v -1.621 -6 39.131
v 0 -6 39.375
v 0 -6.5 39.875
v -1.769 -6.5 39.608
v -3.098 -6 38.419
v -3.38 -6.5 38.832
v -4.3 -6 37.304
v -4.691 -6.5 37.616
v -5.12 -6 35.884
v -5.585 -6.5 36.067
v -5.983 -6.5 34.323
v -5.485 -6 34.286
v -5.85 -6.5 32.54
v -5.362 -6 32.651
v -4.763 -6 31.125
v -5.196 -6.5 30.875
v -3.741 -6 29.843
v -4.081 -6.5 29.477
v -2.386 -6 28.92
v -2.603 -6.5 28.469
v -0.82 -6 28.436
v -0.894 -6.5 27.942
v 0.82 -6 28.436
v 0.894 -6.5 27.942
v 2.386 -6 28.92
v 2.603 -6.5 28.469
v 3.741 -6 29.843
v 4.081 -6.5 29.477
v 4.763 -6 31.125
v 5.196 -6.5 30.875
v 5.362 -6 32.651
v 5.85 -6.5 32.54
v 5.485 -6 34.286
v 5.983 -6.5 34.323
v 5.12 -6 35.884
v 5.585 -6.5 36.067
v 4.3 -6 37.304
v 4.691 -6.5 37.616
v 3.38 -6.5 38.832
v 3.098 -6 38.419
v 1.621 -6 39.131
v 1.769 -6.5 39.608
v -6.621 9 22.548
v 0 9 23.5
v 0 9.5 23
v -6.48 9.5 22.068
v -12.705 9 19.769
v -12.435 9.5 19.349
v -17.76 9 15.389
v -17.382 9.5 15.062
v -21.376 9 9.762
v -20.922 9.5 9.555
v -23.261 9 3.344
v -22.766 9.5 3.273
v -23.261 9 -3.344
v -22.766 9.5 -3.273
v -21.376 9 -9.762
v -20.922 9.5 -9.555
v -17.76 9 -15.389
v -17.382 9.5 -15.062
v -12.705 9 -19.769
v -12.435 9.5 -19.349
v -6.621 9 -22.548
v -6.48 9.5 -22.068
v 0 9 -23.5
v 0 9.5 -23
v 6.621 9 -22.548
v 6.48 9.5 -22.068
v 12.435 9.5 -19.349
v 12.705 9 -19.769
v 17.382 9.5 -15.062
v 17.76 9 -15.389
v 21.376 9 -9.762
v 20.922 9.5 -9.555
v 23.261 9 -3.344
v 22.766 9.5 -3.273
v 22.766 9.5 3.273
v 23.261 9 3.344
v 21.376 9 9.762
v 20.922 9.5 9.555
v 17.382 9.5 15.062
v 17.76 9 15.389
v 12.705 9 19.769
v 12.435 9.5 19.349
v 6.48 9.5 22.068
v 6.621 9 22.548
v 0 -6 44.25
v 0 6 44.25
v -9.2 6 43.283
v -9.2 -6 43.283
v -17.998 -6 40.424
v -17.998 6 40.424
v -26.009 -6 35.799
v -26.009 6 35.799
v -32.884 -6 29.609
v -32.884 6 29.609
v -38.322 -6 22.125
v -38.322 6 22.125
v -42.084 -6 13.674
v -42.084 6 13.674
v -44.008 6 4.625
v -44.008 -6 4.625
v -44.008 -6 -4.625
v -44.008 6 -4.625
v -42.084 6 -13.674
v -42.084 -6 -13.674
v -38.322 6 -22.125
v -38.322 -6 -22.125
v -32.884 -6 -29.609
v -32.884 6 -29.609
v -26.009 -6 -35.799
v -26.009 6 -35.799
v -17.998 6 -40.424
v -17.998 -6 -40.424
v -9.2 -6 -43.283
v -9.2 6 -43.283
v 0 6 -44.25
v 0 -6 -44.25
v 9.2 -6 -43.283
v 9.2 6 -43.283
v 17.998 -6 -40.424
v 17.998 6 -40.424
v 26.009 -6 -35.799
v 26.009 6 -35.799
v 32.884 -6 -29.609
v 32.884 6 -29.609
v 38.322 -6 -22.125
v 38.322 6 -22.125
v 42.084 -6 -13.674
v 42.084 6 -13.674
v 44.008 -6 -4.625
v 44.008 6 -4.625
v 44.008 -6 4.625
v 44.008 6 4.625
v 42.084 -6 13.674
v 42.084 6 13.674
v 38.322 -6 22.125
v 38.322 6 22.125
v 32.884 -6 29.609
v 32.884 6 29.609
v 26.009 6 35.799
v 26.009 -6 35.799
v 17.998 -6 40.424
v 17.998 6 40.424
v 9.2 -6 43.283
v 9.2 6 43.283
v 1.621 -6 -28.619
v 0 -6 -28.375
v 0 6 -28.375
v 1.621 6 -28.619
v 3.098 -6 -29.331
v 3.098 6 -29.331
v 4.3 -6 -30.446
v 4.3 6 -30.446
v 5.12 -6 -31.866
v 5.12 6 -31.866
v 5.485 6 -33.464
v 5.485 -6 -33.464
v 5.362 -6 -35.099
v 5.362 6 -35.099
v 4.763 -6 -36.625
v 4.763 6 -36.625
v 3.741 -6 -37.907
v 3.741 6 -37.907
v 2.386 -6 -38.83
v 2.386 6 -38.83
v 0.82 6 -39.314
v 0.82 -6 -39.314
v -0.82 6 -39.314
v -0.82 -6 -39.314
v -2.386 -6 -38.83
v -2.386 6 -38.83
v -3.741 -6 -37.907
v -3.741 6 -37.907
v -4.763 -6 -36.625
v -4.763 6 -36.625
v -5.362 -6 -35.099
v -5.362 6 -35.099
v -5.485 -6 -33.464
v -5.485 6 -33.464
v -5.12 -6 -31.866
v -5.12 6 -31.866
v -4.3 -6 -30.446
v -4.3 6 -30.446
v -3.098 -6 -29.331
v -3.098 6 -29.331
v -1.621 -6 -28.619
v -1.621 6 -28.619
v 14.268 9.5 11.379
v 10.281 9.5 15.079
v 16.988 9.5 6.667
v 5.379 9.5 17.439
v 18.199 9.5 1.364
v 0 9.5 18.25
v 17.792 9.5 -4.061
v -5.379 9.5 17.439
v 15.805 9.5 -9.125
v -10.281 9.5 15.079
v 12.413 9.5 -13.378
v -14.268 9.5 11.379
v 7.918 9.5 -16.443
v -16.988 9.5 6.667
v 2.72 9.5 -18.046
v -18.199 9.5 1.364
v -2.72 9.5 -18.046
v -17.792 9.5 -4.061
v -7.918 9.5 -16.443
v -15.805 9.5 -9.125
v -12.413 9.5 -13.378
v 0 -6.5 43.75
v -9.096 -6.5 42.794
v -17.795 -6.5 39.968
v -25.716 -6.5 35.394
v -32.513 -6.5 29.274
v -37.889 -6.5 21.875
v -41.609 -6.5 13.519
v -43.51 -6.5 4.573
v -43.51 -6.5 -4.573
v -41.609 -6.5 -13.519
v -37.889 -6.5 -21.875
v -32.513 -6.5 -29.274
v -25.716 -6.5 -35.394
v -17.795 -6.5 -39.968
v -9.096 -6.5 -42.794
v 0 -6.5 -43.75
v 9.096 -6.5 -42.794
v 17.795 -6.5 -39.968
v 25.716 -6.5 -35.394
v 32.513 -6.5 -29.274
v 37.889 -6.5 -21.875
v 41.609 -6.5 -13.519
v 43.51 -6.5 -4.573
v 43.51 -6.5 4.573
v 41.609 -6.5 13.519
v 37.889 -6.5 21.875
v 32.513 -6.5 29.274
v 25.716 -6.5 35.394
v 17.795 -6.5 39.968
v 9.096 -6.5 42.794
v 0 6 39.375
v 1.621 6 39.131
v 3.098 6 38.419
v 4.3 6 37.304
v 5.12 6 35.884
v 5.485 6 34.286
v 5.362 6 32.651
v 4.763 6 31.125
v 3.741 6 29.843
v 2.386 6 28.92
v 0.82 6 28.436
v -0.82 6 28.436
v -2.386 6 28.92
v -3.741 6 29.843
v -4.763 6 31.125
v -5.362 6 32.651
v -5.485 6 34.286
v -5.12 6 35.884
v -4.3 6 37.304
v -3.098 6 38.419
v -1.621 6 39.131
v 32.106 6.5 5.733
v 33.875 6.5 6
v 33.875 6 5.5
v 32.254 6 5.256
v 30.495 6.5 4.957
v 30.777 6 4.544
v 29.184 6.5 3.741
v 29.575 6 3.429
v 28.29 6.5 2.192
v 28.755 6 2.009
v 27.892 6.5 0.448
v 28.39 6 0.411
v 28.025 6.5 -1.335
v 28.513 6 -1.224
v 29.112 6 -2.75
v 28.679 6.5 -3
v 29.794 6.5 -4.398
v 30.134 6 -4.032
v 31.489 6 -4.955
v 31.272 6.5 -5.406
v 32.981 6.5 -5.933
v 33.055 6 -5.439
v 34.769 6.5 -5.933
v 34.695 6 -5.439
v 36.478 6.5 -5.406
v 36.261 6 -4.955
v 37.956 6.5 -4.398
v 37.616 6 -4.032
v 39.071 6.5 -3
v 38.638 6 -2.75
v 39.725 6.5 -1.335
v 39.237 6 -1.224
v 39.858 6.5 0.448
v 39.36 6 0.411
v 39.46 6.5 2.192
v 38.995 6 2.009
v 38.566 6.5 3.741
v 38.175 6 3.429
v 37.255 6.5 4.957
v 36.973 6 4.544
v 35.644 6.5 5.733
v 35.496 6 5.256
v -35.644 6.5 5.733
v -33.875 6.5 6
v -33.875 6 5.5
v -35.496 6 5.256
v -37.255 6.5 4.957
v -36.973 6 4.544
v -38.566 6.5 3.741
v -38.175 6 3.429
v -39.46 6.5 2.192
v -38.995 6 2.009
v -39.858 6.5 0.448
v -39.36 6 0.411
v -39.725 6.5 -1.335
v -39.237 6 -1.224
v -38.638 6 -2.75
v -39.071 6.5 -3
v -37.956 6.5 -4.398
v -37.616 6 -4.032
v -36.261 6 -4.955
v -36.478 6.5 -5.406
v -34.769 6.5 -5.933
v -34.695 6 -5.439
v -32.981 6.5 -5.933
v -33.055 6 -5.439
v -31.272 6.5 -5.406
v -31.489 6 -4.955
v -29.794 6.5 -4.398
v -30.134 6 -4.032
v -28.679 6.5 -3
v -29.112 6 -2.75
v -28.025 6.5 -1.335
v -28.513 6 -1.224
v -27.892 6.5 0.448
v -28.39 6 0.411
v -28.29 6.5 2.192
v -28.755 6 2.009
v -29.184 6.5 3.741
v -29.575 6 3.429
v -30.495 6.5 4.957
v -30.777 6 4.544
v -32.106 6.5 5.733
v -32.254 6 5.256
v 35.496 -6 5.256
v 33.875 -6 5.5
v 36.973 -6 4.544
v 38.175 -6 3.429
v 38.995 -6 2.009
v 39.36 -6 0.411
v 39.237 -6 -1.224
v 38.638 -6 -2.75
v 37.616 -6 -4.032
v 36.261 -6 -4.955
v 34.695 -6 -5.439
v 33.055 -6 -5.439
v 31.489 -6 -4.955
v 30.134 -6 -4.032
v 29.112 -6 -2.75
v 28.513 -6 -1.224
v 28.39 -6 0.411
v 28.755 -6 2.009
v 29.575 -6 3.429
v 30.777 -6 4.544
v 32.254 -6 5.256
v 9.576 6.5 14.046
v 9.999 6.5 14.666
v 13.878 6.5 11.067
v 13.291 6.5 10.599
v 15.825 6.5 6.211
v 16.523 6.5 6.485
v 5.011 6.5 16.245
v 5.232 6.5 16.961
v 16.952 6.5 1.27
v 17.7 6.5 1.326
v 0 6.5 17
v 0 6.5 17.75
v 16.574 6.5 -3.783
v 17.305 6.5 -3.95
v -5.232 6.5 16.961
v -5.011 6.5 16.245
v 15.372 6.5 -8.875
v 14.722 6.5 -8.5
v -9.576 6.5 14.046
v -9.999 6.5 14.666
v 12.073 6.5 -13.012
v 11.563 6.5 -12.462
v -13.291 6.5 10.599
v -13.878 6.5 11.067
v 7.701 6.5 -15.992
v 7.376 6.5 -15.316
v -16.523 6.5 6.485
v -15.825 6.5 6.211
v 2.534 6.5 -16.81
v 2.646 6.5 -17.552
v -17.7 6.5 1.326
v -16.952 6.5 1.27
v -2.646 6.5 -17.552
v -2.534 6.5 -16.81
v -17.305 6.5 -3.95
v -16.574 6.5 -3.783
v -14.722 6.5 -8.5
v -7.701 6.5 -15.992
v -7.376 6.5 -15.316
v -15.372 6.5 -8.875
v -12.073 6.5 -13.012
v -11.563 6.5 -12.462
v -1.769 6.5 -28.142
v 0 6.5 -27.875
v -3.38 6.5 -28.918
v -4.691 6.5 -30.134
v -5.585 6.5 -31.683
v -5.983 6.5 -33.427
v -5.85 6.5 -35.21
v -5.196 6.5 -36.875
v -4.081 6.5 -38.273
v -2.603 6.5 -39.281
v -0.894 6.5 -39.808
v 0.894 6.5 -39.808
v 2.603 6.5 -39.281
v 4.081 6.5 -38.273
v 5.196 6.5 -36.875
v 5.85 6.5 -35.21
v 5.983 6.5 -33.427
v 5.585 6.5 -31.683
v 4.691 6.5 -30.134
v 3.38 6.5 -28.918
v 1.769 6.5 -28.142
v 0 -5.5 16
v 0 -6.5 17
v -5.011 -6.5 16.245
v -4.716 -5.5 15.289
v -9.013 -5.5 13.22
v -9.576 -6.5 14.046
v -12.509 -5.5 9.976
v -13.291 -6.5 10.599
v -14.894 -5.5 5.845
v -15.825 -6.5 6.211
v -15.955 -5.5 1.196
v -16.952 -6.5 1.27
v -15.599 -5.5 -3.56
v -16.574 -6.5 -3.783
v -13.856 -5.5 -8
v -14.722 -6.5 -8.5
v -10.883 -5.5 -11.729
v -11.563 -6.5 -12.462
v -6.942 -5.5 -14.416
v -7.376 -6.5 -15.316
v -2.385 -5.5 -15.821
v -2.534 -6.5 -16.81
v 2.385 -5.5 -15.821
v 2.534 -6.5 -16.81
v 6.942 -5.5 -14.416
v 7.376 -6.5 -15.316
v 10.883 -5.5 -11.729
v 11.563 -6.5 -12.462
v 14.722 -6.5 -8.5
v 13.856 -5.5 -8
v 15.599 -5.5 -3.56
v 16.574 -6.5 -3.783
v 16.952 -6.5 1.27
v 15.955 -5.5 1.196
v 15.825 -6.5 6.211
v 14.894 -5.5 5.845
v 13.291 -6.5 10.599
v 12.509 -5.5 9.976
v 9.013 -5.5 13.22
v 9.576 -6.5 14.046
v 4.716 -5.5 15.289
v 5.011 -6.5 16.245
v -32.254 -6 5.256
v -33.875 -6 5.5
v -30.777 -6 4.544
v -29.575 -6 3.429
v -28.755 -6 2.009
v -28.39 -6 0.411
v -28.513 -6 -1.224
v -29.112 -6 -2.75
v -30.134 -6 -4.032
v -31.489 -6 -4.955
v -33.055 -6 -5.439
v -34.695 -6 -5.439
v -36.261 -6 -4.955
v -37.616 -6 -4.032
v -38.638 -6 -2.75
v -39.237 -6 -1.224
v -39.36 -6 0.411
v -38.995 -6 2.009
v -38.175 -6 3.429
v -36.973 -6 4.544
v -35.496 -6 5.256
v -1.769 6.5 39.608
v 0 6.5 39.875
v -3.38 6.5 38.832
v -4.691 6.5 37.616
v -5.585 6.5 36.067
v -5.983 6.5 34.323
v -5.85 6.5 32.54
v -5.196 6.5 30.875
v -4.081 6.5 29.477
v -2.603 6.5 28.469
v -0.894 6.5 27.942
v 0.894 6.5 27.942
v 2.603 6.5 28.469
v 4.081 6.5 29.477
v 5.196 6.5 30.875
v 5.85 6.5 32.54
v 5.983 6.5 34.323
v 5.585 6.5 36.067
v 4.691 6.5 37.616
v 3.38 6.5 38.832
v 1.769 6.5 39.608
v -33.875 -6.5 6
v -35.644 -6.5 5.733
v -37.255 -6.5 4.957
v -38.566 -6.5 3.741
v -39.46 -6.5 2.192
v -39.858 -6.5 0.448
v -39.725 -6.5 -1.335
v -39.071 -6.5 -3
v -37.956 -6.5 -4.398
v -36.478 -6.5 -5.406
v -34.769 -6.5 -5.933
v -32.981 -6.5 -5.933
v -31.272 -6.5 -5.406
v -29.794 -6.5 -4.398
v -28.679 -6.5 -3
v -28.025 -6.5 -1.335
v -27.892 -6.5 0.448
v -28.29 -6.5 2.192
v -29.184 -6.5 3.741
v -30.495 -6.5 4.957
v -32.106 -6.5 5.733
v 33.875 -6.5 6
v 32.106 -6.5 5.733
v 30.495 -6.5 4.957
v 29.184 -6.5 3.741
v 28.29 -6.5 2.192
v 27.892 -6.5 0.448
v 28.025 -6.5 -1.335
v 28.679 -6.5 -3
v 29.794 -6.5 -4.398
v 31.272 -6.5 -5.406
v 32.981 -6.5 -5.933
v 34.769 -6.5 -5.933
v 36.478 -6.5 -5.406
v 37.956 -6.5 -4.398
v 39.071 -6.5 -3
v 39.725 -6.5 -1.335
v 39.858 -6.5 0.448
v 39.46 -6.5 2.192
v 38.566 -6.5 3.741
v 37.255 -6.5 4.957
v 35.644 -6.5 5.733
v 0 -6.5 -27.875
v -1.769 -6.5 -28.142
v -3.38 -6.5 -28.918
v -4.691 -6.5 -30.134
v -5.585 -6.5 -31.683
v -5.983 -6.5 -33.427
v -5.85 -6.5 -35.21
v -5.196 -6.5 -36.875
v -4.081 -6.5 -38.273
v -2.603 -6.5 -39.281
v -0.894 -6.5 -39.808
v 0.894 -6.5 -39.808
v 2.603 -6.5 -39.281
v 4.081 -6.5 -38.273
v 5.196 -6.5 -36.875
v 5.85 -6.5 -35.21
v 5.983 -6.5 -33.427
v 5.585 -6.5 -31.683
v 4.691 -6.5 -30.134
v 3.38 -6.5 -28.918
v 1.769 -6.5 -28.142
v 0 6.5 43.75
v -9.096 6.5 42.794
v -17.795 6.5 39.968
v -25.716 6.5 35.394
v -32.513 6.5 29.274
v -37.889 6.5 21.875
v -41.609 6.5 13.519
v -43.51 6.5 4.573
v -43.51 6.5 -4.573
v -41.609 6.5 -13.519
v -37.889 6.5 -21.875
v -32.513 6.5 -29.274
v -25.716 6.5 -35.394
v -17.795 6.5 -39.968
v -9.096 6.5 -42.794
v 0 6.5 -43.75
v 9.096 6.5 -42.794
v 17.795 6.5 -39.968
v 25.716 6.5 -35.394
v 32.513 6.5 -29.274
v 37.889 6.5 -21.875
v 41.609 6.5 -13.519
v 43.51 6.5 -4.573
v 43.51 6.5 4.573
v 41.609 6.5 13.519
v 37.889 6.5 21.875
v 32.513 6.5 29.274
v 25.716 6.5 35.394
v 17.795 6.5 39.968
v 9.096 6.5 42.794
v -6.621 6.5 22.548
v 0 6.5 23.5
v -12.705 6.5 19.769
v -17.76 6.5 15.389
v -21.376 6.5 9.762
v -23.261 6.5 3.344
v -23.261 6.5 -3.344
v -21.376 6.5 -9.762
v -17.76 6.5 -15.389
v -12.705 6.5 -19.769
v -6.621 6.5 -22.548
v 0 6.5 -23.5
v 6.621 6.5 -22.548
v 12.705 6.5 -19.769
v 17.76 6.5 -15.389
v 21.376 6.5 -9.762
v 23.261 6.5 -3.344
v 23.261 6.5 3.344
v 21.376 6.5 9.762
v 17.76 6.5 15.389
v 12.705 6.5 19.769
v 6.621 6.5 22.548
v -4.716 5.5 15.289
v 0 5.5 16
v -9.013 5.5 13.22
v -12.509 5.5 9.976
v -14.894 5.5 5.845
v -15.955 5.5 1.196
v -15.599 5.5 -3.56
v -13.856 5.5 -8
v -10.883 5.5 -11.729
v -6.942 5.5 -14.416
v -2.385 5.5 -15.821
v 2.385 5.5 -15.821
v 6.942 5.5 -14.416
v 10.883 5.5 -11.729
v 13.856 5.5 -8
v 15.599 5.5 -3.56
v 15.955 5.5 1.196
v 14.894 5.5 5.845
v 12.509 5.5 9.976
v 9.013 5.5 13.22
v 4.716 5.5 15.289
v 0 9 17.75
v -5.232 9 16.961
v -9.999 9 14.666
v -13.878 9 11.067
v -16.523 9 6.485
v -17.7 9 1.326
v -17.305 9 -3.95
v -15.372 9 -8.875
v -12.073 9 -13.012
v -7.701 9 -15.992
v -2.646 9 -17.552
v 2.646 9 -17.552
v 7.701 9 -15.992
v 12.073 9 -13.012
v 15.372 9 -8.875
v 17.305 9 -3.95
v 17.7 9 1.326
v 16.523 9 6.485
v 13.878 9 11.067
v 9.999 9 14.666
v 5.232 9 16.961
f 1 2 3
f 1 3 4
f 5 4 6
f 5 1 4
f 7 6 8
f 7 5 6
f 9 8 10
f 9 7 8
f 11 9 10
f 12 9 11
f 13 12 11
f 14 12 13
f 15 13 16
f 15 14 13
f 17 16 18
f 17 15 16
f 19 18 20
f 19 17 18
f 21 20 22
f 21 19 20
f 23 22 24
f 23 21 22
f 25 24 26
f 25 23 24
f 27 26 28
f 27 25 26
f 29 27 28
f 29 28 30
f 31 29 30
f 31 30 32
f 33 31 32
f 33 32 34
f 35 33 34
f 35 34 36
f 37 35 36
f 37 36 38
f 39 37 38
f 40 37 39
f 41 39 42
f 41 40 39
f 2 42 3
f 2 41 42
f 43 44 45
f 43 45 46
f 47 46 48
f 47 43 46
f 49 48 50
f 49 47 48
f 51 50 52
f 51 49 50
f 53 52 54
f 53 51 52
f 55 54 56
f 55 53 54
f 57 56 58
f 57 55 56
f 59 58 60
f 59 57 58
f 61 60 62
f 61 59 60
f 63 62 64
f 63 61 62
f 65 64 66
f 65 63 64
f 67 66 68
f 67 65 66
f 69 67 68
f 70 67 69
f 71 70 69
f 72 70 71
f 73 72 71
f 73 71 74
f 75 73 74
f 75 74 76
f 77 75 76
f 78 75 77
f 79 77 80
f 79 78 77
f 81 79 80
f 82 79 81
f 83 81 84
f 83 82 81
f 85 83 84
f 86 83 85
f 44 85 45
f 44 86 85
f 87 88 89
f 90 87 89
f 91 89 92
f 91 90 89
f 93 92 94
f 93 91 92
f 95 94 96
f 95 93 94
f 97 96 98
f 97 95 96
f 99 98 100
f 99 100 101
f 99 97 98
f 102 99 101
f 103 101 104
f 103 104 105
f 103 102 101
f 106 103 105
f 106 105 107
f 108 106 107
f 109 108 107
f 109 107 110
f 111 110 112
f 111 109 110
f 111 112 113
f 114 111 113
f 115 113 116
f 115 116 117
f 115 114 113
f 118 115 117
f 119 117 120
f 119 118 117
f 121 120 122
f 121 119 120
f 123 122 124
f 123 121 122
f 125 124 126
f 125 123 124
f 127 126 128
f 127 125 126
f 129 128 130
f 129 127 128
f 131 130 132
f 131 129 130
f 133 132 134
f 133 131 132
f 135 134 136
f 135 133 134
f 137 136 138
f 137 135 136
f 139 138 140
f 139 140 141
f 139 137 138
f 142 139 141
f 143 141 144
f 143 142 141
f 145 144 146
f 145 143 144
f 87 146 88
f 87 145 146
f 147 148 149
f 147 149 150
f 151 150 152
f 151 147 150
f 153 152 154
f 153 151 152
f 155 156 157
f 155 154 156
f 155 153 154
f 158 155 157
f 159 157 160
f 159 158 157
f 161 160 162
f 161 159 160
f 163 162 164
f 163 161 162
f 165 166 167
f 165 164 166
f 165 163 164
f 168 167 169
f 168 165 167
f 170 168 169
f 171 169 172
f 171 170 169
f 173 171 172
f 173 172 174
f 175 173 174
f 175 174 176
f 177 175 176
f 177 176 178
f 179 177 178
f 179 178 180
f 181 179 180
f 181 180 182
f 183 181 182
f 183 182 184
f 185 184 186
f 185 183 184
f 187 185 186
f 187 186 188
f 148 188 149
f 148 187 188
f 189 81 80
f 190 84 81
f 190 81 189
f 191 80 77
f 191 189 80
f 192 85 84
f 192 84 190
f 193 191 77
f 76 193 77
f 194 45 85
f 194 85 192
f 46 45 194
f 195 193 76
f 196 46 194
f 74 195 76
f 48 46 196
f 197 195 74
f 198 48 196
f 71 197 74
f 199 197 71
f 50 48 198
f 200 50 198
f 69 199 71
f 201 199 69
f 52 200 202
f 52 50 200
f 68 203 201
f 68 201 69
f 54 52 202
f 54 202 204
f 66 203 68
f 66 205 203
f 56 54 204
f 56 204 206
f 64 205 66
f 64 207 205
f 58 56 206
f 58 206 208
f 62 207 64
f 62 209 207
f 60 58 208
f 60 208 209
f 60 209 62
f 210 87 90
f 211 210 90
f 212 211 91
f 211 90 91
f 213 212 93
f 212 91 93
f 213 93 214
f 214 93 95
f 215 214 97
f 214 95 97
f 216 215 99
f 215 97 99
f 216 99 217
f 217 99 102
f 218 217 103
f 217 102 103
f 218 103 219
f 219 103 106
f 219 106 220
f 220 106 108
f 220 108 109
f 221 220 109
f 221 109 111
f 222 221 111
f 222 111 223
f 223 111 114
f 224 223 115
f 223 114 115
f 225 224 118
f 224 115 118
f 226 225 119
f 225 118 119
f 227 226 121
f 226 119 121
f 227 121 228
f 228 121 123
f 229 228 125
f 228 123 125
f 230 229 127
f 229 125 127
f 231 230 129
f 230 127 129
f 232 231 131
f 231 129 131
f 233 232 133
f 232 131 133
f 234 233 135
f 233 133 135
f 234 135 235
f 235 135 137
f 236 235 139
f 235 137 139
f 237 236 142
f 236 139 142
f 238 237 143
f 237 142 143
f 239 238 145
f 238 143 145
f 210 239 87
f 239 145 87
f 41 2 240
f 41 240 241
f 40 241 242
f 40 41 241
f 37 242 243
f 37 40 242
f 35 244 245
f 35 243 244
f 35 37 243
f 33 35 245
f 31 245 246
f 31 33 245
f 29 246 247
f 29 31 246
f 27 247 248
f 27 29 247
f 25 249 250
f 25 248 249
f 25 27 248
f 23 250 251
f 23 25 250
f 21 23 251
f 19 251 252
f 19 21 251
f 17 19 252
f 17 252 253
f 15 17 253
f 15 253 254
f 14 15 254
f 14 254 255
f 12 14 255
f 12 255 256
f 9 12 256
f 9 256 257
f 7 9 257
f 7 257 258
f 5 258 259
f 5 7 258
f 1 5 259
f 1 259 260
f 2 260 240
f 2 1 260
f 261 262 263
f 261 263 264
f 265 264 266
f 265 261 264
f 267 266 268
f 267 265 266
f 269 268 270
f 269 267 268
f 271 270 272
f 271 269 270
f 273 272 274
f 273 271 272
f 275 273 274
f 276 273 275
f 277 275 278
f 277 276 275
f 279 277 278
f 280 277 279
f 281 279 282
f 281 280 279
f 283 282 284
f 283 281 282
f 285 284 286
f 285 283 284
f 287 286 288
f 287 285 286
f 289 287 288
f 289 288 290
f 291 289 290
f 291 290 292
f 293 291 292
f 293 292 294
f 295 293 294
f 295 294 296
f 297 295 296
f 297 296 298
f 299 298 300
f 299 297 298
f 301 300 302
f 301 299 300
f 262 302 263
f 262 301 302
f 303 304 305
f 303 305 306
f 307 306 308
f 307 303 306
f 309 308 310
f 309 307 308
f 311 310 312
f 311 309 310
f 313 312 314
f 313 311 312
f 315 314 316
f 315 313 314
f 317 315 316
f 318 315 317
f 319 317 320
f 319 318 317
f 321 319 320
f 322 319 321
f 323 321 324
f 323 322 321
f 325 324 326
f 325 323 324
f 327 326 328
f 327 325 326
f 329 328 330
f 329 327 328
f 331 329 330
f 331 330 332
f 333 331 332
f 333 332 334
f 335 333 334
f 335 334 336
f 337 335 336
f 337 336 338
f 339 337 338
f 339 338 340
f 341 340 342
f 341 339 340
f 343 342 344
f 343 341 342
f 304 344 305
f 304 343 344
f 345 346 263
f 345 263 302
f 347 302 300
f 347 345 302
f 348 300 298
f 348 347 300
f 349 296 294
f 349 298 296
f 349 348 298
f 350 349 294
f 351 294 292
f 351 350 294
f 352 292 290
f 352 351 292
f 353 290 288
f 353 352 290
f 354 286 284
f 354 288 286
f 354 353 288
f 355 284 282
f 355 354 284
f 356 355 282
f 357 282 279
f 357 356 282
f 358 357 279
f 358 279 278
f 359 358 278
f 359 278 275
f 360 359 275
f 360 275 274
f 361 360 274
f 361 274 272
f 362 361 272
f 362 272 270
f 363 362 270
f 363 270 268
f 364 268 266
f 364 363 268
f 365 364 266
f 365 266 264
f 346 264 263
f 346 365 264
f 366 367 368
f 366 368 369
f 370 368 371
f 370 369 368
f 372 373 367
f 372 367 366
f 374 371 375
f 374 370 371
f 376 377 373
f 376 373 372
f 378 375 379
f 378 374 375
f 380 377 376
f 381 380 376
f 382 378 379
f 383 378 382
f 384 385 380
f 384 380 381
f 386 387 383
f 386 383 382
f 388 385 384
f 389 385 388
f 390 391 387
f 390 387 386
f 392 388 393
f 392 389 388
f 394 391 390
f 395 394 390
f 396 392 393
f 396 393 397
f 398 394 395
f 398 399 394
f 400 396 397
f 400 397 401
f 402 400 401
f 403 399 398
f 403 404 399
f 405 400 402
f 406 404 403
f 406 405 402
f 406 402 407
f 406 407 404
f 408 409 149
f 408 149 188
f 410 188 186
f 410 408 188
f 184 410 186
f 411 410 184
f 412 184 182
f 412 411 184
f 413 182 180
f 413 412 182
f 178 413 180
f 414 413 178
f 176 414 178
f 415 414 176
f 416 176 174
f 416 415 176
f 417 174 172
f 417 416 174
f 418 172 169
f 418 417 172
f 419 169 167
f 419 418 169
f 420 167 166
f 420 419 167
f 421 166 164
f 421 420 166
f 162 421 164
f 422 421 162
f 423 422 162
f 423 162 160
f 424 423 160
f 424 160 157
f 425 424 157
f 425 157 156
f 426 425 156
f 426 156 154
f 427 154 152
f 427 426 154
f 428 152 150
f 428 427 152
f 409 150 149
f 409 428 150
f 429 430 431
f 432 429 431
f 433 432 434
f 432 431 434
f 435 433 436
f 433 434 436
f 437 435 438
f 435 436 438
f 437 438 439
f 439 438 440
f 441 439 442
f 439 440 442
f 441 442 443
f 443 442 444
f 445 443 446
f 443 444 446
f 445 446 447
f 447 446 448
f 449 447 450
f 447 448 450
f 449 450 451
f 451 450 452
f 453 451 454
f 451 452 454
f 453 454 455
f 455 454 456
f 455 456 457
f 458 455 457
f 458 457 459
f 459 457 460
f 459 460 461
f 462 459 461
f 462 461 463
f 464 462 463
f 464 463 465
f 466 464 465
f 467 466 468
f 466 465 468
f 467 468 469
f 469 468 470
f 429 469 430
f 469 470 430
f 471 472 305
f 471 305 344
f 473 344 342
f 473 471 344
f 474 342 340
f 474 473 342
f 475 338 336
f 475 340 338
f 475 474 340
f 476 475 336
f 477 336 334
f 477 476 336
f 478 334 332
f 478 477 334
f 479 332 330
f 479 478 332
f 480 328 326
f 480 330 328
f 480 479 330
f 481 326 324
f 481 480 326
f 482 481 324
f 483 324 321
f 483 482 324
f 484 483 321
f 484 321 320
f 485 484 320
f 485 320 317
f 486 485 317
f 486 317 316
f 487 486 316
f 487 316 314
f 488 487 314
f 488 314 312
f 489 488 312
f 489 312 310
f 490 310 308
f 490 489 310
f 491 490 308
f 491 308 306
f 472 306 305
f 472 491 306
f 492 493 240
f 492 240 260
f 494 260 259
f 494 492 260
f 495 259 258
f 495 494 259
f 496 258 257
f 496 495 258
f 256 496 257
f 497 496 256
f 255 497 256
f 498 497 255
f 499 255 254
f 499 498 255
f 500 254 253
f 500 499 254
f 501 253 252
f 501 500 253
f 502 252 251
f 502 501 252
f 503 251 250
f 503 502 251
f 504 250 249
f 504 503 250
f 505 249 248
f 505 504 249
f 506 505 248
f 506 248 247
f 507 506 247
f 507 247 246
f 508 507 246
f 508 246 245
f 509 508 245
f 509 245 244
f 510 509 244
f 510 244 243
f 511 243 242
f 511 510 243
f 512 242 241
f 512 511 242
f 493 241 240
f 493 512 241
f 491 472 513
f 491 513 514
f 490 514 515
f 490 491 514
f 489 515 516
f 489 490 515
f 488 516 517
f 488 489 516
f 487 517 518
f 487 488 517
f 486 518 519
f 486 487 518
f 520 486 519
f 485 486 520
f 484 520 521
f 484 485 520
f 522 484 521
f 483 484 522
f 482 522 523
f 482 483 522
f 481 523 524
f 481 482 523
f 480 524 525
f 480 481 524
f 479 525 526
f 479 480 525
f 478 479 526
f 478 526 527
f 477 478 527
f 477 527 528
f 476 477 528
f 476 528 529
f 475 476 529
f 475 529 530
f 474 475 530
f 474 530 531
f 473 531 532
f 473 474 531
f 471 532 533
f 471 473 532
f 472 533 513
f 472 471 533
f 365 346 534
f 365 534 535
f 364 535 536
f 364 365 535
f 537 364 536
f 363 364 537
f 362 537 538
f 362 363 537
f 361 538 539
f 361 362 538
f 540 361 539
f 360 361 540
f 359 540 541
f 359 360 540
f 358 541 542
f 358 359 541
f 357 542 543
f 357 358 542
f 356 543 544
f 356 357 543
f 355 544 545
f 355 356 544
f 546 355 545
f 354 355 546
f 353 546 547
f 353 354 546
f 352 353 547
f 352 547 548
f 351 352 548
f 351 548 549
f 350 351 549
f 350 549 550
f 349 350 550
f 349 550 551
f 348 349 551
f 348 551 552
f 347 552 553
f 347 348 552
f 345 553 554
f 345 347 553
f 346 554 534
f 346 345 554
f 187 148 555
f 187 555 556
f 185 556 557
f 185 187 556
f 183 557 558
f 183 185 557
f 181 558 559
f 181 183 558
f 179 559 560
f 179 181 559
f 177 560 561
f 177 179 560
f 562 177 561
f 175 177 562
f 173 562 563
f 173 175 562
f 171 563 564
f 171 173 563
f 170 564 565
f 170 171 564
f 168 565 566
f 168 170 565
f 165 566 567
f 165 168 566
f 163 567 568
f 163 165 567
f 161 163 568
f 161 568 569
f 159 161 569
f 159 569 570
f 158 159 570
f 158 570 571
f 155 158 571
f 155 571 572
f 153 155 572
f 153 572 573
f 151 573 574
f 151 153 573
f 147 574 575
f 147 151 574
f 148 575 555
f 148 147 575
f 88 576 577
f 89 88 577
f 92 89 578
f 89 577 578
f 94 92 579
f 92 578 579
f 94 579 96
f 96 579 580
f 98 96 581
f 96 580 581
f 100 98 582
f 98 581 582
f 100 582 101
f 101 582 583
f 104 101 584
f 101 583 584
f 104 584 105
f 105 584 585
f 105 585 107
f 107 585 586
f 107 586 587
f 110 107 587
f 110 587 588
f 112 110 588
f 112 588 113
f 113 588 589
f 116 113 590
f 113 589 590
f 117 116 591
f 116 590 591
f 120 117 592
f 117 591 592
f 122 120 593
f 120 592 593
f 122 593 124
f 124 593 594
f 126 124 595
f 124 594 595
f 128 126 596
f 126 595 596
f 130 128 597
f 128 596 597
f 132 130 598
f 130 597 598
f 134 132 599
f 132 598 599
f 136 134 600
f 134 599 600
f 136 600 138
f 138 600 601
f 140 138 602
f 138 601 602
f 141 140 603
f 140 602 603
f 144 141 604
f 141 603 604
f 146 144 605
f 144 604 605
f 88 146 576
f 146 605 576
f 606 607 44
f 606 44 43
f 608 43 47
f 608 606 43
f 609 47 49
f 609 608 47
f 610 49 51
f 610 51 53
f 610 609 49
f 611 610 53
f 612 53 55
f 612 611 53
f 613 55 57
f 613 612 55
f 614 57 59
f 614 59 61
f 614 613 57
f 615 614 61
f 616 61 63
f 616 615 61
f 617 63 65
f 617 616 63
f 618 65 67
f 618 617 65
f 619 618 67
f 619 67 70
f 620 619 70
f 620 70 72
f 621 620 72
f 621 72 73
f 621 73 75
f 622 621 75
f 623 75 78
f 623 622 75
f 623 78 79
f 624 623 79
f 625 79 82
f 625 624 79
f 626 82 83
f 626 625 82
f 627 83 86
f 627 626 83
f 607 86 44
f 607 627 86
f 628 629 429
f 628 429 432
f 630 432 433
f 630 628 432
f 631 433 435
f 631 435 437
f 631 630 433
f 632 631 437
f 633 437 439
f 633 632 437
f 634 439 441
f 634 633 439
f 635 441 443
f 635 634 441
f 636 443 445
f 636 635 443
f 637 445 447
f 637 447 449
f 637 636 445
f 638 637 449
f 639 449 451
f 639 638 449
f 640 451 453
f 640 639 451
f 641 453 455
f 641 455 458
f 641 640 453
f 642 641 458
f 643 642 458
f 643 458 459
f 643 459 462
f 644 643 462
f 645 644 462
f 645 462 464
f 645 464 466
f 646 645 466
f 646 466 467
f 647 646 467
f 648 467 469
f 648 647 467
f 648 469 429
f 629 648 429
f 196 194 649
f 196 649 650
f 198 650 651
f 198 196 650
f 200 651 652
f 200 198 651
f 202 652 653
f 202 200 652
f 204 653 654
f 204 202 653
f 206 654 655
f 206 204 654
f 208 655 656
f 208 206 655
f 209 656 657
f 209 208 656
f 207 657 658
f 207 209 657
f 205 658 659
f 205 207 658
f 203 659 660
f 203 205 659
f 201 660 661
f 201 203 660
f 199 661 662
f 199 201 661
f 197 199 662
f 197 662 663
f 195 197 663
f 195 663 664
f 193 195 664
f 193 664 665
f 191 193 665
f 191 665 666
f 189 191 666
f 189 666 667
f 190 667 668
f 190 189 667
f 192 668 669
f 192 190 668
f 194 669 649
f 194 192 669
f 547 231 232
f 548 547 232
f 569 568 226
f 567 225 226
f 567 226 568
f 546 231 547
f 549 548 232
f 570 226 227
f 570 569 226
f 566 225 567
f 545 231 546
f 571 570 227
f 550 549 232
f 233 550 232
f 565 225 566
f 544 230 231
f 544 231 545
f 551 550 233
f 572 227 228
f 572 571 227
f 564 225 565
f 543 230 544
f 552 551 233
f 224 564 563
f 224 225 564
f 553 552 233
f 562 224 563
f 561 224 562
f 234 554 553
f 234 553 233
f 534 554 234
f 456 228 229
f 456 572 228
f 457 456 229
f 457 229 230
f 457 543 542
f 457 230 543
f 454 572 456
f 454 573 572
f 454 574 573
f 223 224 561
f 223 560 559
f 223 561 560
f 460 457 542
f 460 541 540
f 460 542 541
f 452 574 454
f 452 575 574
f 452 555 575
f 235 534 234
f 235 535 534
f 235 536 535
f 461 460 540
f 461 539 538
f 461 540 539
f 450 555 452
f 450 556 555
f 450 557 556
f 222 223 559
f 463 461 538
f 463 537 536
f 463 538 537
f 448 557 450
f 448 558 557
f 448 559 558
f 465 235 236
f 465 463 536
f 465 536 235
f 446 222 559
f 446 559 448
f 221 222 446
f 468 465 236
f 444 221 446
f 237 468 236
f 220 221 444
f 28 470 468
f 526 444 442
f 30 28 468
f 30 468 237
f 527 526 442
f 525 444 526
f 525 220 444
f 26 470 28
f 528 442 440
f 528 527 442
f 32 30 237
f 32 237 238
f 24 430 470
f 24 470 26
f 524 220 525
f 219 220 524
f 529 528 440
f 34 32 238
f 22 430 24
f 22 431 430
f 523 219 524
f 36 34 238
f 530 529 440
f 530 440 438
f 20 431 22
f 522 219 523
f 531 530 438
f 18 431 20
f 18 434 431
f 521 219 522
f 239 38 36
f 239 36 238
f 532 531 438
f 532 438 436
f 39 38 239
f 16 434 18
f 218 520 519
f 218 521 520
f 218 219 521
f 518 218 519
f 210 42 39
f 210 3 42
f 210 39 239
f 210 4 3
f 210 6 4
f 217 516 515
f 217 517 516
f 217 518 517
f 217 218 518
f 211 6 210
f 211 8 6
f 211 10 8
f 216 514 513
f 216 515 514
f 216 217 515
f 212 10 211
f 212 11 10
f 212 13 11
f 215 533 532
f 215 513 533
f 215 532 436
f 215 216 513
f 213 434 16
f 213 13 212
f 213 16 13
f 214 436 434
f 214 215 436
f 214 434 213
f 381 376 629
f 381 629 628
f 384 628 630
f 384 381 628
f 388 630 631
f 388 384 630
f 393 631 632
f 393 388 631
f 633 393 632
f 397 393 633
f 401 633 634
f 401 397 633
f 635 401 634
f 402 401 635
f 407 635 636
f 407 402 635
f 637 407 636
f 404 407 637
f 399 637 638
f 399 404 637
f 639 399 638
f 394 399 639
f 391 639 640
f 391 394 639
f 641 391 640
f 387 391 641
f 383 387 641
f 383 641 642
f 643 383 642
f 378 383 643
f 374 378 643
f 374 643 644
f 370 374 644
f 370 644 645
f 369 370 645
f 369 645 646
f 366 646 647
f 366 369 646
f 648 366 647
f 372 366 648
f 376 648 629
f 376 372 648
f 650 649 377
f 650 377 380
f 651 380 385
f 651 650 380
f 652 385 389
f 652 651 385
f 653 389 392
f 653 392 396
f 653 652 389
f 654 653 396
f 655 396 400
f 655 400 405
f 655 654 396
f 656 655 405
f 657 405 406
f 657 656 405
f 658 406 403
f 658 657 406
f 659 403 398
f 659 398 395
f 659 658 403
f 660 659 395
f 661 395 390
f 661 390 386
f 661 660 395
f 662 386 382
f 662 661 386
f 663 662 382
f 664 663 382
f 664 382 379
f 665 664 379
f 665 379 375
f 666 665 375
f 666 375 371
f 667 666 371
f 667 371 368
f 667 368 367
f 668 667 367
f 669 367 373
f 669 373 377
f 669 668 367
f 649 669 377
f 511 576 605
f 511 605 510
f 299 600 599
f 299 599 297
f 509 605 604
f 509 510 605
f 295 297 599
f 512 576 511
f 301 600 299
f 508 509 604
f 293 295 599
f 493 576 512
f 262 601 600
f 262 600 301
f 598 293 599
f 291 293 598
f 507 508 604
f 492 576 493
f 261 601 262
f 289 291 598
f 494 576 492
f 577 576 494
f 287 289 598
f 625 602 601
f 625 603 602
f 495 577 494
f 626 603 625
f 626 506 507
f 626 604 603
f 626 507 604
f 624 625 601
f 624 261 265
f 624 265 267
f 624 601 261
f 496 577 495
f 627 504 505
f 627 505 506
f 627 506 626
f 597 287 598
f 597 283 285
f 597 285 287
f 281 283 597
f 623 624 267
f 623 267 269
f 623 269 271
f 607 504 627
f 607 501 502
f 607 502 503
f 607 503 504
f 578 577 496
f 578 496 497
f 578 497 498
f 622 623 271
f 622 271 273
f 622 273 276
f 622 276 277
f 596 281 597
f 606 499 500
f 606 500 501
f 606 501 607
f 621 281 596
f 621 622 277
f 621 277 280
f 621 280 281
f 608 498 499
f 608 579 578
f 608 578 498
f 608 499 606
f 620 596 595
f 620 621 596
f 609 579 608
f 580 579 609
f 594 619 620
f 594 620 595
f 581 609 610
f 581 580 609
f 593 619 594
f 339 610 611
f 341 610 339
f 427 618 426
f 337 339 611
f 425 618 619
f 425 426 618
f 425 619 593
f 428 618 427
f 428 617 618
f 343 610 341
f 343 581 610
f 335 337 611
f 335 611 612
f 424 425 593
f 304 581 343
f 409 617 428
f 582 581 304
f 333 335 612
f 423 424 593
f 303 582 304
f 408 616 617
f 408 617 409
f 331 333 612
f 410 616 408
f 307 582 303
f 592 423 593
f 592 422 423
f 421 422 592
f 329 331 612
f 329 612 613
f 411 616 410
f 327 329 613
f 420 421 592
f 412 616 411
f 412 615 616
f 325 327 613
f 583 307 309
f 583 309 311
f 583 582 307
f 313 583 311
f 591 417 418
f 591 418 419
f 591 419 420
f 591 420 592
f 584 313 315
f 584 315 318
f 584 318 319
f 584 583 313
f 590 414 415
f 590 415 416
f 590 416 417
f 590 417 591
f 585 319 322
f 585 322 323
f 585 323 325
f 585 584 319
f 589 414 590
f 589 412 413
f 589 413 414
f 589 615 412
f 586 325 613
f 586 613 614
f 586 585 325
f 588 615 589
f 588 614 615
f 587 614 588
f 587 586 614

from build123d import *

# Parameters (mm, degrees)
CORTAR_EXTRUIR1_DEPTH      = 64.295931939
CORTAR_EXTRUIR1_DEPTH_BACK = 64.295931939
CROQUIS2_R                 = 5.5
CHAFL_N1_SIZE              = 1
CHAFL_N2_SIZE              = 0.5


with BuildPart() as part:
    # Croquis1 → Revolución1 (revolve)
    with BuildSketch(Plane(origin=(0, 0, 0), x_dir=(0, 0, -1), z_dir=(1, 0, 0))):
        Polygon((-16, -6.5), (-16, 6.5), (-17.75, 6.5), (-17.75, 9.5), (-23.5, 9.5), (-23.5, 6.5), (-44.25, 6.5), (-44.25, -6.5), align=None)
    revolve(axis=Axis((0, 0, 0), (0, -1, 0)))

    # Croquis2 → Cortar-Extruir1 (cut, two sides: drawn at the far end of the back side and taken through both)
    with BuildSketch(Plane(origin=(0, 0, 0), x_dir=(1, 0, 0), z_dir=(0, 1, 0)).offset(-CORTAR_EXTRUIR1_DEPTH_BACK)):
        with Locations(Location((0, 33.875, 0), (0, 0, 270))):
            Circle(CROQUIS2_R)
        with Locations(Location((33.875, 0, 0), (0, 0, 270))):
            Circle(CROQUIS2_R)
        with Locations(Location((0, -33.875, 0), (0, 0, 270))):
            Circle(CROQUIS2_R)
        with Locations(Location((-33.875, 0, 0), (0, 0, 270))):
            Circle(CROQUIS2_R)
    extrude(amount=CORTAR_EXTRUIR1_DEPTH + CORTAR_EXTRUIR1_DEPTH_BACK, mode=Mode.SUBTRACT)

    # Chaflán1
    chafl_n1_edges = [part.edges().sort_by_distance(p)[0] for p in [
        (0, 6.5, -16),
        (0, -6.5, -16),
    ]]
    chamfer(chafl_n1_edges, length=CHAFL_N1_SIZE)

    # Chaflán2
    chafl_n2_edges = [part.edges().sort_by_distance(p)[0] for p in [
        (0, 6.5, -39.375),
        (0, -6.5, -39.375),
        (33.875, 6.5, -5.5),
        (33.875, -6.5, -5.5),
        (0, 6.5, 28.375),
        (0, -6.5, 28.375),
        (-33.875, 6.5, -5.5),
        (-33.875, -6.5, -5.5),
        (0, -6.5, -44.25),
        (0, 6.5, -44.25),
        (0, 9.5, -23.5),
        (0, 9.5, -17.75),
    ]]
    chamfer(chafl_n2_edges, length=CHAFL_N2_SIZE)


solid = part.part
